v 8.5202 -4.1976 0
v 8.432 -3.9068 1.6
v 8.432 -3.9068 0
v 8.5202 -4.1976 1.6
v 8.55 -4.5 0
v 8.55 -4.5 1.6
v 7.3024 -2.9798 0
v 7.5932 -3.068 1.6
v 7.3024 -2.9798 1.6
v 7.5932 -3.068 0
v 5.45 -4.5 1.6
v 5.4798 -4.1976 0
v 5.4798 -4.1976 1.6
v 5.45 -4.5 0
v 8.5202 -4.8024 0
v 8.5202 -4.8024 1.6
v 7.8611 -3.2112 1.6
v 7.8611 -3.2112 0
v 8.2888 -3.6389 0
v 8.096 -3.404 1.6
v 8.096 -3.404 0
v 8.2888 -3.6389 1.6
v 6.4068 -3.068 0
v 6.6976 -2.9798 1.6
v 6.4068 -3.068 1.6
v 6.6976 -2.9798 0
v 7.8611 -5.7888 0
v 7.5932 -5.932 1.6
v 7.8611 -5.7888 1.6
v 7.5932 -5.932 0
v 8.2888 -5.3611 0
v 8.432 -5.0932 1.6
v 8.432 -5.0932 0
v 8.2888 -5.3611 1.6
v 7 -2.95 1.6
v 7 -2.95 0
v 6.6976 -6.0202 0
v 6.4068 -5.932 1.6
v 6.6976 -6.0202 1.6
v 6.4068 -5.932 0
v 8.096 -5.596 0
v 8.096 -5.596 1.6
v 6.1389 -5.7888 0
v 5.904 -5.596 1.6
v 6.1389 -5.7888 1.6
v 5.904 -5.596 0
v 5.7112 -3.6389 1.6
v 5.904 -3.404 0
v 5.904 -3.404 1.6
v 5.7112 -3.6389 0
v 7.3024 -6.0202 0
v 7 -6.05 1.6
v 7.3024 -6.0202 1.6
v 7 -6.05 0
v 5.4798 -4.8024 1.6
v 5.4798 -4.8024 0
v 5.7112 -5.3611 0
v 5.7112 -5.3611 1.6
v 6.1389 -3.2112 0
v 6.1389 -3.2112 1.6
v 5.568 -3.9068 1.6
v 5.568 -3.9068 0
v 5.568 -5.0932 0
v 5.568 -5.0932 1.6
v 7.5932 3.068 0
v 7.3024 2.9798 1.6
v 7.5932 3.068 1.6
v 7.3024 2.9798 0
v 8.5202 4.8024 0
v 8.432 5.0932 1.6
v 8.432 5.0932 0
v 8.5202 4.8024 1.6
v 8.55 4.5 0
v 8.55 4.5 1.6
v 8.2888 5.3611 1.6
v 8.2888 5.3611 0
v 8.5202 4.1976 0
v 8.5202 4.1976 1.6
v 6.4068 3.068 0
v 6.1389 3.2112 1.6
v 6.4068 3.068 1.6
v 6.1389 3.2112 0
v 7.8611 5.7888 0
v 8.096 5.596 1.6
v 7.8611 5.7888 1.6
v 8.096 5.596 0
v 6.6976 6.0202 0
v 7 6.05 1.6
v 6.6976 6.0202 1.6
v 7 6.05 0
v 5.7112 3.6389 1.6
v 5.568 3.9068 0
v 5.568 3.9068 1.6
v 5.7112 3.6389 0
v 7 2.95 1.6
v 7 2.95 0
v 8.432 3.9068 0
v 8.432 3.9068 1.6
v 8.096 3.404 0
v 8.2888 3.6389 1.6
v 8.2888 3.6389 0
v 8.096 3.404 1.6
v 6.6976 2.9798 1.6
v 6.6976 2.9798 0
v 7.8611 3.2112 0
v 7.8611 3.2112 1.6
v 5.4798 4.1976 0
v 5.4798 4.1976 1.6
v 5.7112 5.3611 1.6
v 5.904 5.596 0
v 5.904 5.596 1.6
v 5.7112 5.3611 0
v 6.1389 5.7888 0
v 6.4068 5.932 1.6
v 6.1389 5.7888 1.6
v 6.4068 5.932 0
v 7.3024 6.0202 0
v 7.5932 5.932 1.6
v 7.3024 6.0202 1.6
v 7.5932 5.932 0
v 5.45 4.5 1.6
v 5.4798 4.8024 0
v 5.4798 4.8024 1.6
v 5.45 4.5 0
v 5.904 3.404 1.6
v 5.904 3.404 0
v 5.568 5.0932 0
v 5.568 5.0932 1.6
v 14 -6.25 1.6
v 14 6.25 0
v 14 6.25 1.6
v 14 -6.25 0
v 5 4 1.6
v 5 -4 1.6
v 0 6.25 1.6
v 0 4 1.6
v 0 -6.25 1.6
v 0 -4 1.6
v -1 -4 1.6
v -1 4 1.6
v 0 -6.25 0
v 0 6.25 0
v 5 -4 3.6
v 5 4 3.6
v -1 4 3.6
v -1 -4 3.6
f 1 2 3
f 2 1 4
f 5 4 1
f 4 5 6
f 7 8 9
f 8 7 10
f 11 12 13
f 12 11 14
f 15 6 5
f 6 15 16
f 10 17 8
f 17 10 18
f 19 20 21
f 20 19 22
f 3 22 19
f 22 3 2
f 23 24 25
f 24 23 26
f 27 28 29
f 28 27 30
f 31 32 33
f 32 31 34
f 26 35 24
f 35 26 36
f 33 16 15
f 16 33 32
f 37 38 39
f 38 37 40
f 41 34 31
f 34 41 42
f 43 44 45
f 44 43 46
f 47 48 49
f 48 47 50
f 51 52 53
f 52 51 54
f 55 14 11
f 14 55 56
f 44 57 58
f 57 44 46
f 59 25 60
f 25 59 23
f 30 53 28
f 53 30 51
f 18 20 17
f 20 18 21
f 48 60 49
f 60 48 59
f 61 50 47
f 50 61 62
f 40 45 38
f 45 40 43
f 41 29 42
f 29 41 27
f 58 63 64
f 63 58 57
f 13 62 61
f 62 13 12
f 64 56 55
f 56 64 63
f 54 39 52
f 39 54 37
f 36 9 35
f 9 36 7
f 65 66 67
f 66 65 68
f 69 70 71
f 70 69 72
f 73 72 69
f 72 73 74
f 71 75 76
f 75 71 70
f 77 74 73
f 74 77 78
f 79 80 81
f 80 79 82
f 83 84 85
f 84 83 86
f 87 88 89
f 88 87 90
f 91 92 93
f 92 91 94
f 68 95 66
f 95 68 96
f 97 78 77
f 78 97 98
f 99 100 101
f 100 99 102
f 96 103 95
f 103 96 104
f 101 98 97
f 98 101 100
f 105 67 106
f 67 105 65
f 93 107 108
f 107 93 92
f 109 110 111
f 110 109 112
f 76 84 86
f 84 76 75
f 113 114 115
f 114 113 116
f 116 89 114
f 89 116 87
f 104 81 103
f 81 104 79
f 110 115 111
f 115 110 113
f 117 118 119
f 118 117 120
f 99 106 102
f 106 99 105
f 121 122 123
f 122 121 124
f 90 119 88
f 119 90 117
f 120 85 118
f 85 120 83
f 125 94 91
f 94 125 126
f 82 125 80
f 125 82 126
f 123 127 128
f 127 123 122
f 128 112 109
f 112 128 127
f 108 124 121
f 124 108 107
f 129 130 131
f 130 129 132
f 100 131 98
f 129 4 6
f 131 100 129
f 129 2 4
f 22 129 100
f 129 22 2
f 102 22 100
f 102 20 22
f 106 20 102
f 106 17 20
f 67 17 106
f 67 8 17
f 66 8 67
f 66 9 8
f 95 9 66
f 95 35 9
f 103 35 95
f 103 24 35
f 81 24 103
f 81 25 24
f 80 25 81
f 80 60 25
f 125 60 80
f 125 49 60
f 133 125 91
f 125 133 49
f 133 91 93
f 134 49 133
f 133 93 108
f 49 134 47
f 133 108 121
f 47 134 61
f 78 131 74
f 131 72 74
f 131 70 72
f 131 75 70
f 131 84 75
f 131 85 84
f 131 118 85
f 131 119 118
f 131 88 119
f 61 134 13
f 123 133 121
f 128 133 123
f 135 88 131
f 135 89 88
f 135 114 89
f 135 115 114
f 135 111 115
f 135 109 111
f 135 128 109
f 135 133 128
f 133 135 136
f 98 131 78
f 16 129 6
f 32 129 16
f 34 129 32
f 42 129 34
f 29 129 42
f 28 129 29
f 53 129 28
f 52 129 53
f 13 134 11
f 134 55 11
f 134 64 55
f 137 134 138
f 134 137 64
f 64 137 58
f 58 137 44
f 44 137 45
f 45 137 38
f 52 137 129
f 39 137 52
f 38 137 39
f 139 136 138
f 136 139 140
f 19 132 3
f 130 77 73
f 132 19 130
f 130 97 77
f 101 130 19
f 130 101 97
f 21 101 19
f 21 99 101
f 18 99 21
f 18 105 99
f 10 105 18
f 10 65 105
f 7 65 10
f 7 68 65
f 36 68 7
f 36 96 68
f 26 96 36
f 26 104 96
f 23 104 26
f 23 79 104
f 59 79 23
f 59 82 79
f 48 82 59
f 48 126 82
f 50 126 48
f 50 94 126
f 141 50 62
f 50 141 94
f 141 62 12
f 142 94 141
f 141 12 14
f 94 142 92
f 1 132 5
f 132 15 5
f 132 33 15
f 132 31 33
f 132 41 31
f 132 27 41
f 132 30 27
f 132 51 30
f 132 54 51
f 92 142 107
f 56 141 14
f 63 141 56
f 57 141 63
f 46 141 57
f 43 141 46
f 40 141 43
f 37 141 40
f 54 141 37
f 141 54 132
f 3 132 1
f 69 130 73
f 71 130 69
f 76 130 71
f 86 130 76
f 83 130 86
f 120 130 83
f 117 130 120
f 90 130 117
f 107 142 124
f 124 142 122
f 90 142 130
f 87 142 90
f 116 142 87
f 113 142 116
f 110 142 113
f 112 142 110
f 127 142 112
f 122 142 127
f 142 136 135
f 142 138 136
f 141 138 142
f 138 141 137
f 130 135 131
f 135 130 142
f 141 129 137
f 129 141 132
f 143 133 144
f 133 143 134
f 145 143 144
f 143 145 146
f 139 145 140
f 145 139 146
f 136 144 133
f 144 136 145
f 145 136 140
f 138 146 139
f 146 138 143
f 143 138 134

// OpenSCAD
pcb_dimensions = [14, 12.5, 1.6];

usb_port_dimensions = [6, 8, 2];
usb_port_overhang = 1;

mounting_hole_diameter = 3.1;
mounting_hole_centres = 9;

module UsbBreakout()
{
  difference()
  {
    /* PCB */
    translate([0, -pcb_dimensions[1] / 2, 0])
    {
      color("green")
      {
        cube(pcb_dimensions);
      }
    }

    /* Mounting holes */
    for(y = [-mounting_hole_centres / 2, mounting_hole_centres / 2])
    {
      translate([pcb_dimensions[0] / 2, y, 0])
      {
        cylinder(d=mounting_hole_diameter, h=20, center=true, $fn=32);
      }
    }
  }

  /* USB port */
  translate([-usb_port_overhang, -usb_port_dimensions[1] / 2, pcb_dimensions[2]])
  {
    color("silver")
    {
      cube(usb_port_dimensions);
    }
  }
}

UsbBreakout();
